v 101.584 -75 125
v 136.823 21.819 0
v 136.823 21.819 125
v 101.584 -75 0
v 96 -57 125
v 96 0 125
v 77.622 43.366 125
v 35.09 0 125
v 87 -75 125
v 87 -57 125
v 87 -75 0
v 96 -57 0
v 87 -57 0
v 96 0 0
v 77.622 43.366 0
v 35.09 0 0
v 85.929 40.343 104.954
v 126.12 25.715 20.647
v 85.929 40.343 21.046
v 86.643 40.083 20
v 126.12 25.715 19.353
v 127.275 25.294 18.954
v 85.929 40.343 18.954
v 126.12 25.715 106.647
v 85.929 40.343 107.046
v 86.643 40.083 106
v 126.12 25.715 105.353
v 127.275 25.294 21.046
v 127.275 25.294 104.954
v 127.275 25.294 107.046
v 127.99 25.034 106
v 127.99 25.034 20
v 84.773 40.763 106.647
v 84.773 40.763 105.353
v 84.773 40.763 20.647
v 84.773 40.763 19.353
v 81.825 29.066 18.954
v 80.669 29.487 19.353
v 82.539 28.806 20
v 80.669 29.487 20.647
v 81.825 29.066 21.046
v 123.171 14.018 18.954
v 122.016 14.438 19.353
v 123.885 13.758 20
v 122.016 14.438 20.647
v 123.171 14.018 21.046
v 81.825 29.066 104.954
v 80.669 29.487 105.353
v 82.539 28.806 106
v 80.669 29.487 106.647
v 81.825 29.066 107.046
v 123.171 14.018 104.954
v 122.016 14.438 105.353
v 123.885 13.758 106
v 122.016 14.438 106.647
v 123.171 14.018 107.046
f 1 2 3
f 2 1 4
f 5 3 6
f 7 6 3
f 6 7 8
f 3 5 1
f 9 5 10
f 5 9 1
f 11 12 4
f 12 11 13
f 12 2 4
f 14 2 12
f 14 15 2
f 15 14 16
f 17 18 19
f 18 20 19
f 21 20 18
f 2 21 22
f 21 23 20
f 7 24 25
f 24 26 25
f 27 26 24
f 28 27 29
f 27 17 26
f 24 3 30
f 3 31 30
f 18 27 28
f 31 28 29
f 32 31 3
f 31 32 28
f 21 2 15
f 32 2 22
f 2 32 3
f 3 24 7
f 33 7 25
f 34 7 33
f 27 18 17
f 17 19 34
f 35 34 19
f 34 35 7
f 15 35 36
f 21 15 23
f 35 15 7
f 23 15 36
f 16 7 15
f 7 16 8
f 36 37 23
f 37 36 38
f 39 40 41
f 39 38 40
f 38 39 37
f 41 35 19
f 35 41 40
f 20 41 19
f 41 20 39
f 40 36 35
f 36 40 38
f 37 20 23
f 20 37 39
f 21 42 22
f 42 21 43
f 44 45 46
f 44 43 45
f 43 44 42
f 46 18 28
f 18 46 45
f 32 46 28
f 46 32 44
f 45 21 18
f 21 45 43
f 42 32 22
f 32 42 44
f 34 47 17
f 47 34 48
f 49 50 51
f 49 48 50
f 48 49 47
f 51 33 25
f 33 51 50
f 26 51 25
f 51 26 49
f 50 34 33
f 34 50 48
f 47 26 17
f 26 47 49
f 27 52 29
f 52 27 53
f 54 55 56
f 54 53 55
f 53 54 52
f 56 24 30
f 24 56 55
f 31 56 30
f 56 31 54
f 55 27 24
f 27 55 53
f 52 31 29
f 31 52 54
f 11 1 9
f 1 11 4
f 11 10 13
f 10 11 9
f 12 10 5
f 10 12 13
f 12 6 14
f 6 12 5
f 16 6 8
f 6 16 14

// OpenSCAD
 //translate([0,-20,10]) {
//       rotate([90,180,90]) {

module wall() 
{
    translate([0, 0, -10])
    linear_extrude(150) 
    {
        polygon(
            points = 
            [
                [-100, 0],      
                [96,0],      
                [96, -57],
                [87, -57],
                [87, -75],
                [130, -75],
                [130, -120],
                [-100, -120]
            ]
        );
    }
}

ring_height = 125;
ring_width = 63;
ring_thickness = 110;

hole_radius = 1.1;
hole_distance_x = 44;
hole_distance_y = 86;
hole_offset_x = 8.5;
hole_offset_y = 20;
hole_length = 22;

module mount()
{
    cube([ring_width, ring_thickness, ring_height]);
    linear_extrude(ring_height)
    {
        polygon(
            points = 
            [
                [2, 0],
                [-50, 0],
                [0, ring_thickness]
            ]
        );
    }
}

module holes()
{
    translate([0, 120, 0])
    rotate([90, 0, 0])
    {
        // Make holes for original mount
        translate([hole_offset_x, hole_offset_y, 0]) 
        cylinder(h = hole_length, r = hole_radius);
        
        translate([hole_offset_x + hole_distance_x, hole_offset_y, 0]) 
        cylinder(h = hole_length, r = hole_radius);

        translate([hole_offset_x, hole_offset_y + hole_distance_y, 0]) 
        cylinder(h = hole_length, r = hole_radius);

        translate([hole_offset_x + hole_distance_x, hole_offset_y + hole_distance_y, 0]) 
        cylinder(h = hole_length, r = hole_radius);
    }
}

module mount_with_holes()
{
    difference()
    {
        mount();
        holes();

    }
}
difference()
{
    translate([+40, -60, 0]) rotate([0, 0, -20]) mount_with_holes();
    wall();
}


    //   }
   //}
